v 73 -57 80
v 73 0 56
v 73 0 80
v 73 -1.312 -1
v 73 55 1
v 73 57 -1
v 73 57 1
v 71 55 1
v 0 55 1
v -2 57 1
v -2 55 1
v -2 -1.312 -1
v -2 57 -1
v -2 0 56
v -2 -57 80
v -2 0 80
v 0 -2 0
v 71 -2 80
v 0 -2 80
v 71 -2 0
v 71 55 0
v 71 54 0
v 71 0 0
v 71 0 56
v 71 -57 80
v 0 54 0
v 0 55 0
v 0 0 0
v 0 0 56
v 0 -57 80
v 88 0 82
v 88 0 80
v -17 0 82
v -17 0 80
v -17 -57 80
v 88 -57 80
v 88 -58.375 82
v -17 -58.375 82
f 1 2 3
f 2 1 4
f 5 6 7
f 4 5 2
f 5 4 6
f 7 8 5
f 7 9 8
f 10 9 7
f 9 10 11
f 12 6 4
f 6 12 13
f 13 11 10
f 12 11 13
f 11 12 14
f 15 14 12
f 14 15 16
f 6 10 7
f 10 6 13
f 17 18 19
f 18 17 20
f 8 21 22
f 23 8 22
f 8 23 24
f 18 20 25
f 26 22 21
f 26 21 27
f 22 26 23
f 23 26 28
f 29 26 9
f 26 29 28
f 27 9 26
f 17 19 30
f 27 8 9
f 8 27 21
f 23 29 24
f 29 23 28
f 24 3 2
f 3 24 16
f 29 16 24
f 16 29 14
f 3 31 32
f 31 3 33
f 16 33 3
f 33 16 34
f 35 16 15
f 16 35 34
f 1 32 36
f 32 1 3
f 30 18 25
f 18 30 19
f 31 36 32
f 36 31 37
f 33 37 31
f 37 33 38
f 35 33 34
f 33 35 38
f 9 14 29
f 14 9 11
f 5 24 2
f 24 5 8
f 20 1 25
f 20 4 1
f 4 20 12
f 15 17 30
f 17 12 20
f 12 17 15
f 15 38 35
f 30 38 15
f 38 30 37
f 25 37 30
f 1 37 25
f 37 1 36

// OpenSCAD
module desk(){
    difference(){
        translate([-2,-2,-1])cube([71+4, 55+4, 2]);
        cube([71, 55, 2]);
    }
    translate([-2,-2,0]) cube([71+4,2,80]);
    translate([-15-2,-55-4,80]) cube([71+4+30, 55+4, 2]);

    translate([-2,-55-4,-1]) cube([2, 55+4, 80+1]);
    translate([71,-55-4,-1]) cube([2, 55+4, 80+1]);
    
    translate([0,55,1])
    rotate([45,0,0])
    translate([-2,-55,0])
    cube([2,55,80]);
    
    translate([0,55,1])
    rotate([45,0,0])
    translate([71,-55,0])
    cube([2,55,80]);
}

difference(){
    desk();
    translate([0,-2,0])
    rotate([atan2(55,80),0,0])
    translate([-50,-100,-5])
    cube([200,100,200]);
    
    #translate([-50,-100,-200-1])
    cube([200,200,200]);
    
    
}
